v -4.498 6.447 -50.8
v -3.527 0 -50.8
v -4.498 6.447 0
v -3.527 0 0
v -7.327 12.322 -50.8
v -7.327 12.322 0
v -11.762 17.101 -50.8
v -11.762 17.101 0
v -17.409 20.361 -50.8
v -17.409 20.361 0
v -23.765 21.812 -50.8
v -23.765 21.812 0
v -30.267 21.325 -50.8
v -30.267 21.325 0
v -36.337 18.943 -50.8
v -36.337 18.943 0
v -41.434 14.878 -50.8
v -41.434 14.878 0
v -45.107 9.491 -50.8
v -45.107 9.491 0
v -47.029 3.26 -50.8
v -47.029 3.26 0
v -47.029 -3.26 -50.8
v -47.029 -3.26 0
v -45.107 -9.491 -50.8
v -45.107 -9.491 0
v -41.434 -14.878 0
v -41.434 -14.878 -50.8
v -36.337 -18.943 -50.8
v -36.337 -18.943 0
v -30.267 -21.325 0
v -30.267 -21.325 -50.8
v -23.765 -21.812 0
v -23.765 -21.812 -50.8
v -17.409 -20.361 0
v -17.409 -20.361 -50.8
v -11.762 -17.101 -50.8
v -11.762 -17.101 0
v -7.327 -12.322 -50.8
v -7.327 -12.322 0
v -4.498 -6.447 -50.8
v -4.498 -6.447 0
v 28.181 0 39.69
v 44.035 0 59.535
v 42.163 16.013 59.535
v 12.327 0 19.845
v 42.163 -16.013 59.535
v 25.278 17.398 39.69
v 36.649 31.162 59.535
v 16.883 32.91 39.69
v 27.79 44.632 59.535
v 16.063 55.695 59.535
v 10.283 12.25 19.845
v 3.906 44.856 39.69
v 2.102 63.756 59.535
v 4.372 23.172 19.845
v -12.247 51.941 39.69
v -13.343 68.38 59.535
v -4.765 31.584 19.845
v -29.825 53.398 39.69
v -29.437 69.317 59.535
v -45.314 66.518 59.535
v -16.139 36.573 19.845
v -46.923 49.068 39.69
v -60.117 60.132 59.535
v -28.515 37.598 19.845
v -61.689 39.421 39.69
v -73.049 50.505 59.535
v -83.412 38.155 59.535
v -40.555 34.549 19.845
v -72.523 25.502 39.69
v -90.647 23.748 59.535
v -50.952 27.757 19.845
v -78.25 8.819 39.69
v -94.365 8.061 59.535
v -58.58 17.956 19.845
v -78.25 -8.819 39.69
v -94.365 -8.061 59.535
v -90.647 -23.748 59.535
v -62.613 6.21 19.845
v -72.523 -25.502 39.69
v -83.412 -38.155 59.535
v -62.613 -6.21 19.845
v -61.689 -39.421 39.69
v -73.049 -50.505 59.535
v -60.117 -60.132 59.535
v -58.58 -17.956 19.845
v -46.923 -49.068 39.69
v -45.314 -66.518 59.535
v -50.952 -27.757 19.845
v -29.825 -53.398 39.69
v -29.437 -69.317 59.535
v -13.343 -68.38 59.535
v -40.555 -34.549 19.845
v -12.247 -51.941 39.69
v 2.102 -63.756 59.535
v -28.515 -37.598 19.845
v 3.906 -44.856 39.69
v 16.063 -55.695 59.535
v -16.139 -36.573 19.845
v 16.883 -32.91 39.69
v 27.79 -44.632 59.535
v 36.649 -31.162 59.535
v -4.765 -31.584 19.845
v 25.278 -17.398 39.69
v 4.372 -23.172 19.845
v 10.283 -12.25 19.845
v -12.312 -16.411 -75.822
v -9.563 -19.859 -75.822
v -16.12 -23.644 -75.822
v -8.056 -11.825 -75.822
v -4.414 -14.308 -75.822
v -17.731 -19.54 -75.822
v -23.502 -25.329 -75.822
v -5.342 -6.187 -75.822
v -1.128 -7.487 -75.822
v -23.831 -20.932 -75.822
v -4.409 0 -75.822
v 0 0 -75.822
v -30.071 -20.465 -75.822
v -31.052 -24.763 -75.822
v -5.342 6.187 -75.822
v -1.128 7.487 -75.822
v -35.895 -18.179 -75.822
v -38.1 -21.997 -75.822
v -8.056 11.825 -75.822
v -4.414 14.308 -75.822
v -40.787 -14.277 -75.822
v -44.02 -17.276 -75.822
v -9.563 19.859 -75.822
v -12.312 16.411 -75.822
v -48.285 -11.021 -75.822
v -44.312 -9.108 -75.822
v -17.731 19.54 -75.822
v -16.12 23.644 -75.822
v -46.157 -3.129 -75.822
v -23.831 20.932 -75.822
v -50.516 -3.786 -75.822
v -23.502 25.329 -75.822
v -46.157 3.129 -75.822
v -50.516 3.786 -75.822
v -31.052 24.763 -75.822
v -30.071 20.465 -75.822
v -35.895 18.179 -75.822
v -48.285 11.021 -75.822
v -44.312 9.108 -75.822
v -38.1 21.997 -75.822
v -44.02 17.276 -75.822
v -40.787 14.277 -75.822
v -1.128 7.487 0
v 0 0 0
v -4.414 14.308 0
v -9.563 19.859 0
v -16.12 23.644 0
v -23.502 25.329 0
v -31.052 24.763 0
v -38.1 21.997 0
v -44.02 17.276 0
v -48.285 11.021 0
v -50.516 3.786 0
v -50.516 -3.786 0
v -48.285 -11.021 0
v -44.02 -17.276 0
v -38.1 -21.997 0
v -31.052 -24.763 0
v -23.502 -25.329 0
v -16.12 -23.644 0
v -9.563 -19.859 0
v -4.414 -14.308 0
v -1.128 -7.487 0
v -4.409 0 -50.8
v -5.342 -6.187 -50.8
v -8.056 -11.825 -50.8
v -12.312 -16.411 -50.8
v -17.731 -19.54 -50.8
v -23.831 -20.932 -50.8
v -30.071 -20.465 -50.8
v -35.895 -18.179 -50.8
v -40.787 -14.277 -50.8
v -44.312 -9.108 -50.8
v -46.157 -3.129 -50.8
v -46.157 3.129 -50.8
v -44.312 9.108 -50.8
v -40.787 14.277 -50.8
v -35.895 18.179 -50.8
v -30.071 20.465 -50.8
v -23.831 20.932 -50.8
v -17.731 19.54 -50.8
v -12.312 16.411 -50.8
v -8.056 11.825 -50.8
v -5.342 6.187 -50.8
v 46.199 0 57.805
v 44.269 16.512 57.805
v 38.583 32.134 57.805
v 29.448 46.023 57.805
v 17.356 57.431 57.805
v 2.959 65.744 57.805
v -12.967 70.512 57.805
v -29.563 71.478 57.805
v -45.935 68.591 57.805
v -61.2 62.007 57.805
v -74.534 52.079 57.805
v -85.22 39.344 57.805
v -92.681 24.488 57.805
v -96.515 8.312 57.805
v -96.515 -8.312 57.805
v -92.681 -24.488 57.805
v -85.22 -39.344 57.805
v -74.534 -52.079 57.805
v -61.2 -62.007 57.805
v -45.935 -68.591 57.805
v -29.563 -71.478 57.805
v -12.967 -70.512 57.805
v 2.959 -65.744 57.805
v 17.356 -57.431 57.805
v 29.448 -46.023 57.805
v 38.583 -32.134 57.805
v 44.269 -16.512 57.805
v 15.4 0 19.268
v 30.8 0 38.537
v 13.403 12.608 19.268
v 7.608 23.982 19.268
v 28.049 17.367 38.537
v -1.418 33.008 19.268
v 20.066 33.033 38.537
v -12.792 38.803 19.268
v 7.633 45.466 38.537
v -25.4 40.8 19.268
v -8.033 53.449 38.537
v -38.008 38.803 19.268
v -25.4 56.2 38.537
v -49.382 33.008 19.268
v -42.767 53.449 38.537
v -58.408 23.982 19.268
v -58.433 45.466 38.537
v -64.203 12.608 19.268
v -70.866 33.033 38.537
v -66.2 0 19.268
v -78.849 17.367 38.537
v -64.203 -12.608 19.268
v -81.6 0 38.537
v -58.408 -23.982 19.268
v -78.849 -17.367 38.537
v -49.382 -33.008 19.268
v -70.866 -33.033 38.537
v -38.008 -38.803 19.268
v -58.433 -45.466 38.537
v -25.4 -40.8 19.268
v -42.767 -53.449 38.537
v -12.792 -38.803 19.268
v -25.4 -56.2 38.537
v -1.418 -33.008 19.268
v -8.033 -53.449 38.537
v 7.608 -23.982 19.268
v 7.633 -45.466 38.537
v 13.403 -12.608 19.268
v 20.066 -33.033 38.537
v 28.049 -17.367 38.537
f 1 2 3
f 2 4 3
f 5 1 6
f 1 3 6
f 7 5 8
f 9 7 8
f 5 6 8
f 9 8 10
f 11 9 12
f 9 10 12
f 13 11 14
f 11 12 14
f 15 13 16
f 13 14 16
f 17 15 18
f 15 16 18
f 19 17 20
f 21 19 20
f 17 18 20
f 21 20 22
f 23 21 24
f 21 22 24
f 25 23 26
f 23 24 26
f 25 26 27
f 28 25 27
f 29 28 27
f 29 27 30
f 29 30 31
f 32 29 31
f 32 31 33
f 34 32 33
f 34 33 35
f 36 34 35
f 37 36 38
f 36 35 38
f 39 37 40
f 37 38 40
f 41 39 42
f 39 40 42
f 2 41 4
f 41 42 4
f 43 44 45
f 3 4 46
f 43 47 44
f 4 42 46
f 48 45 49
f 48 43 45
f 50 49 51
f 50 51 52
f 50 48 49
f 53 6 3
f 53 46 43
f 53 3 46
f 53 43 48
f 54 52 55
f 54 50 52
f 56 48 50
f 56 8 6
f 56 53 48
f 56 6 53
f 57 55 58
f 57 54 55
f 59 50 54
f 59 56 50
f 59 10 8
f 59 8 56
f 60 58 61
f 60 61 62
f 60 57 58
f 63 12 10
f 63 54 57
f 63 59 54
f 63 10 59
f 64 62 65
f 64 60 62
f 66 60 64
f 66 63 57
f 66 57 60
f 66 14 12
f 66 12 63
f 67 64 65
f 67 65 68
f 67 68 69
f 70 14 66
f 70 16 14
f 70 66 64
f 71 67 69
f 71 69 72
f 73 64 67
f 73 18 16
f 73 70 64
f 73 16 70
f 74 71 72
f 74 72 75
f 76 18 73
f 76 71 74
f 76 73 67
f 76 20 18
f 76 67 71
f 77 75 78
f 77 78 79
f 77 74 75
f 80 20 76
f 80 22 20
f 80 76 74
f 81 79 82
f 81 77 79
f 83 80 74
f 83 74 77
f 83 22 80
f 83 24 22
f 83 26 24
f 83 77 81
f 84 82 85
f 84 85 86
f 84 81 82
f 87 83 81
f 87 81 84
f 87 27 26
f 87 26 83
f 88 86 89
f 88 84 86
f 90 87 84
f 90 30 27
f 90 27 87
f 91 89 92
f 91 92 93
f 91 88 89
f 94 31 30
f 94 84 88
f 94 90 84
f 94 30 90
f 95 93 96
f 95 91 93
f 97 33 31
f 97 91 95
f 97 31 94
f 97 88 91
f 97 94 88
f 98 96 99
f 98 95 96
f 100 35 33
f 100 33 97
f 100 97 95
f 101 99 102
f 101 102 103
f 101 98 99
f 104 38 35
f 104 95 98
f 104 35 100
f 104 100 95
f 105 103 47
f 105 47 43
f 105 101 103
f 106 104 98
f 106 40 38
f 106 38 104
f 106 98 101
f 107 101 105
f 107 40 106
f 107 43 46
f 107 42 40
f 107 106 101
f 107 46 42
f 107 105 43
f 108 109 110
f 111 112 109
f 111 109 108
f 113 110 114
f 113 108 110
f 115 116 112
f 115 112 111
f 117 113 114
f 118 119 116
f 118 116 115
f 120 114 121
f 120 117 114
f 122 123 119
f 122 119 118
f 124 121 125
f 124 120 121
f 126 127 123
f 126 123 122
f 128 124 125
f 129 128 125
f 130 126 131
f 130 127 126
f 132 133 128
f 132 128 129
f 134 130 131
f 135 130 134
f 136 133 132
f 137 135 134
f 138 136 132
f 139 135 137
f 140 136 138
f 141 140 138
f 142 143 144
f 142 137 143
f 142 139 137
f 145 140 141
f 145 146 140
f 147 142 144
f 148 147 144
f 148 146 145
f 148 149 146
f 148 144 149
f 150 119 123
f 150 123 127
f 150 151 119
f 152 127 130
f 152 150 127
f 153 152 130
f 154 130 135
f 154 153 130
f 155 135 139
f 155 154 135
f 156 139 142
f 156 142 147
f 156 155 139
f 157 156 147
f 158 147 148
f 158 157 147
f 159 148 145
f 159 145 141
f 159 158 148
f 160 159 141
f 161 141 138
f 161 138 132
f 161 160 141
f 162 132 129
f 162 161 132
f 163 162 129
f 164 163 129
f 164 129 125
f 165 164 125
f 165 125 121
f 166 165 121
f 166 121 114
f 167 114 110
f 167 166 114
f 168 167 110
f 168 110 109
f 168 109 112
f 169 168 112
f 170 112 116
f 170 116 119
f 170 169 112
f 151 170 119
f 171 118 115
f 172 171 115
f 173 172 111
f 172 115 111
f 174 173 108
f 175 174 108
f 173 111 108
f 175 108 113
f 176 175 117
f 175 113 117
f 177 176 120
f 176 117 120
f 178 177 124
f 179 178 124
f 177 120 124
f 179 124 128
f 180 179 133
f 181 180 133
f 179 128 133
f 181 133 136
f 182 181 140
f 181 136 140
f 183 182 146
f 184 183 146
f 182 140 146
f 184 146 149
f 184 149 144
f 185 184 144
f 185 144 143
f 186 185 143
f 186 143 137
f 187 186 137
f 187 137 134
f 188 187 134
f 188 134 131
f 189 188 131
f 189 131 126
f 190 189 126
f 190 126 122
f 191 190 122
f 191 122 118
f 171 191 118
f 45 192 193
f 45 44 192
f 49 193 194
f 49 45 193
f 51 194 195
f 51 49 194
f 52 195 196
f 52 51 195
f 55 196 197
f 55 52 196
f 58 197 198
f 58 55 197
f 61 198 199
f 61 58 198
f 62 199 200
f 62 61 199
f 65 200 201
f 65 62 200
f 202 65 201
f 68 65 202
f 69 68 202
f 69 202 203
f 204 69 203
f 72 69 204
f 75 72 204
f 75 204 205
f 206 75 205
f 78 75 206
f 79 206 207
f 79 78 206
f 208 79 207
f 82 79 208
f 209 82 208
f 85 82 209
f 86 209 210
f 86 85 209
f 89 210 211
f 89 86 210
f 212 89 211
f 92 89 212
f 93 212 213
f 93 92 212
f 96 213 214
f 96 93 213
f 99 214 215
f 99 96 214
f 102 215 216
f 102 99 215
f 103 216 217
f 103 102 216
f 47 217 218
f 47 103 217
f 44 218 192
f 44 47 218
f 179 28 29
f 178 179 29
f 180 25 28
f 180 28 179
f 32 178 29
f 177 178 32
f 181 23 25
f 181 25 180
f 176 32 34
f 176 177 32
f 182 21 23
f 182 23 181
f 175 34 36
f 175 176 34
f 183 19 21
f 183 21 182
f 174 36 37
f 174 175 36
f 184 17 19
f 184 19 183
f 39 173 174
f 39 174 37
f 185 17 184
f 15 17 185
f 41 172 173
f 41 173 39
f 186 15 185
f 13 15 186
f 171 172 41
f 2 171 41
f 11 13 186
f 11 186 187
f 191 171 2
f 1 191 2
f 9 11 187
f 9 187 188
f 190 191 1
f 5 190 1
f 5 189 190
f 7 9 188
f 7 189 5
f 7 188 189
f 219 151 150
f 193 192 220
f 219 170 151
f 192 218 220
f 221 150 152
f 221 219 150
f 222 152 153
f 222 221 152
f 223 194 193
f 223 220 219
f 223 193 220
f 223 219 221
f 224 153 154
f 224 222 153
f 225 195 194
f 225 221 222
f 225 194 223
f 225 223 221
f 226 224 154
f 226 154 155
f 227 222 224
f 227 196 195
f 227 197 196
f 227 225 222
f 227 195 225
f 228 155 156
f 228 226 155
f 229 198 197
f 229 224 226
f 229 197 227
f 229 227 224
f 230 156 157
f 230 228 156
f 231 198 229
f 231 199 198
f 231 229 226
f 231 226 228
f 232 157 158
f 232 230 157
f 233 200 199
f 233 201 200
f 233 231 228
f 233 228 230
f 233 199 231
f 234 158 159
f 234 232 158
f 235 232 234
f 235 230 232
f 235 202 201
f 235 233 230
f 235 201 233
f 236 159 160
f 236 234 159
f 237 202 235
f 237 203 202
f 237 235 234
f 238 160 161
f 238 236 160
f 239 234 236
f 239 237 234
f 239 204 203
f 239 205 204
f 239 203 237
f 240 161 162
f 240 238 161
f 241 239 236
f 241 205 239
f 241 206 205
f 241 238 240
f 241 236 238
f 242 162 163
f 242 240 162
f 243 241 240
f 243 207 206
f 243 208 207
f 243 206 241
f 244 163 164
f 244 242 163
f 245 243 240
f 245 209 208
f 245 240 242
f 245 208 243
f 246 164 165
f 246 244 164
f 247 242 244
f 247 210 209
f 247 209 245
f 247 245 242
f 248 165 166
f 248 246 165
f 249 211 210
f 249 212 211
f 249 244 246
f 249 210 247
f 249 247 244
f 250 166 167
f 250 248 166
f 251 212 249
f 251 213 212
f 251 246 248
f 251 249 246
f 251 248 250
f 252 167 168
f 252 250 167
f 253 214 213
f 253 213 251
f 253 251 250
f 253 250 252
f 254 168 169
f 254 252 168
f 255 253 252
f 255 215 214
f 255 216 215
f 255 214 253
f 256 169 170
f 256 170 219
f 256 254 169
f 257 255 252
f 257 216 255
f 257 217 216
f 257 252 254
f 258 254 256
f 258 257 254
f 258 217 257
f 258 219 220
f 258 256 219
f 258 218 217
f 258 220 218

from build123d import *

# Parameters (mm, degrees)
F2_R     = 20.9909587058
F3_DEPTH = 25.4
F4_DEPTH = 25.4
F5_DEPTH = 25.4


with BuildPart() as f1:
    # F0 (on Front) → F1 (revolve)
    with BuildSketch(Plane.XZ):
        Polygon((0, -75.8221521974), (0, 0), (46.1993237782, 57.8052623537), (44.0345804445, 59.5346382788), (-3.5266100895, 0), (-25.4, 0), (-25.4, -75.8221521974), align=None)
    revolve(axis=Axis((-25.4, 0, -37.9110760987), (0, 0, 1)))

    # F2 (on face) → F3 (cut)
    with BuildSketch(Plane(origin=(0, 0, -75.8221521974), x_dir=(1, 0, 0), z_dir=(0, 0, -1))):
        with Locations((-25.4, 0)):
            Circle(F2_R)
    extrude(amount=-F3_DEPTH, mode=Mode.SUBTRACT)

    # F4 (cut): a face of the model
    f4_faces = [f1.faces().sort_by_distance(p)[0] for p in [
        (-25.4, 0, 0),
    ]]
    extrude(f4_faces, amount=-F4_DEPTH, mode=Mode.SUBTRACT)

    # F5 (cut): a face of the model
    f5_faces = [f1.faces().sort_by_distance(p)[0] for p in [
        (-25.4, 0, -25.4),
    ]]
    extrude(f5_faces, amount=-F5_DEPTH, mode=Mode.SUBTRACT)


solid = f1.part
